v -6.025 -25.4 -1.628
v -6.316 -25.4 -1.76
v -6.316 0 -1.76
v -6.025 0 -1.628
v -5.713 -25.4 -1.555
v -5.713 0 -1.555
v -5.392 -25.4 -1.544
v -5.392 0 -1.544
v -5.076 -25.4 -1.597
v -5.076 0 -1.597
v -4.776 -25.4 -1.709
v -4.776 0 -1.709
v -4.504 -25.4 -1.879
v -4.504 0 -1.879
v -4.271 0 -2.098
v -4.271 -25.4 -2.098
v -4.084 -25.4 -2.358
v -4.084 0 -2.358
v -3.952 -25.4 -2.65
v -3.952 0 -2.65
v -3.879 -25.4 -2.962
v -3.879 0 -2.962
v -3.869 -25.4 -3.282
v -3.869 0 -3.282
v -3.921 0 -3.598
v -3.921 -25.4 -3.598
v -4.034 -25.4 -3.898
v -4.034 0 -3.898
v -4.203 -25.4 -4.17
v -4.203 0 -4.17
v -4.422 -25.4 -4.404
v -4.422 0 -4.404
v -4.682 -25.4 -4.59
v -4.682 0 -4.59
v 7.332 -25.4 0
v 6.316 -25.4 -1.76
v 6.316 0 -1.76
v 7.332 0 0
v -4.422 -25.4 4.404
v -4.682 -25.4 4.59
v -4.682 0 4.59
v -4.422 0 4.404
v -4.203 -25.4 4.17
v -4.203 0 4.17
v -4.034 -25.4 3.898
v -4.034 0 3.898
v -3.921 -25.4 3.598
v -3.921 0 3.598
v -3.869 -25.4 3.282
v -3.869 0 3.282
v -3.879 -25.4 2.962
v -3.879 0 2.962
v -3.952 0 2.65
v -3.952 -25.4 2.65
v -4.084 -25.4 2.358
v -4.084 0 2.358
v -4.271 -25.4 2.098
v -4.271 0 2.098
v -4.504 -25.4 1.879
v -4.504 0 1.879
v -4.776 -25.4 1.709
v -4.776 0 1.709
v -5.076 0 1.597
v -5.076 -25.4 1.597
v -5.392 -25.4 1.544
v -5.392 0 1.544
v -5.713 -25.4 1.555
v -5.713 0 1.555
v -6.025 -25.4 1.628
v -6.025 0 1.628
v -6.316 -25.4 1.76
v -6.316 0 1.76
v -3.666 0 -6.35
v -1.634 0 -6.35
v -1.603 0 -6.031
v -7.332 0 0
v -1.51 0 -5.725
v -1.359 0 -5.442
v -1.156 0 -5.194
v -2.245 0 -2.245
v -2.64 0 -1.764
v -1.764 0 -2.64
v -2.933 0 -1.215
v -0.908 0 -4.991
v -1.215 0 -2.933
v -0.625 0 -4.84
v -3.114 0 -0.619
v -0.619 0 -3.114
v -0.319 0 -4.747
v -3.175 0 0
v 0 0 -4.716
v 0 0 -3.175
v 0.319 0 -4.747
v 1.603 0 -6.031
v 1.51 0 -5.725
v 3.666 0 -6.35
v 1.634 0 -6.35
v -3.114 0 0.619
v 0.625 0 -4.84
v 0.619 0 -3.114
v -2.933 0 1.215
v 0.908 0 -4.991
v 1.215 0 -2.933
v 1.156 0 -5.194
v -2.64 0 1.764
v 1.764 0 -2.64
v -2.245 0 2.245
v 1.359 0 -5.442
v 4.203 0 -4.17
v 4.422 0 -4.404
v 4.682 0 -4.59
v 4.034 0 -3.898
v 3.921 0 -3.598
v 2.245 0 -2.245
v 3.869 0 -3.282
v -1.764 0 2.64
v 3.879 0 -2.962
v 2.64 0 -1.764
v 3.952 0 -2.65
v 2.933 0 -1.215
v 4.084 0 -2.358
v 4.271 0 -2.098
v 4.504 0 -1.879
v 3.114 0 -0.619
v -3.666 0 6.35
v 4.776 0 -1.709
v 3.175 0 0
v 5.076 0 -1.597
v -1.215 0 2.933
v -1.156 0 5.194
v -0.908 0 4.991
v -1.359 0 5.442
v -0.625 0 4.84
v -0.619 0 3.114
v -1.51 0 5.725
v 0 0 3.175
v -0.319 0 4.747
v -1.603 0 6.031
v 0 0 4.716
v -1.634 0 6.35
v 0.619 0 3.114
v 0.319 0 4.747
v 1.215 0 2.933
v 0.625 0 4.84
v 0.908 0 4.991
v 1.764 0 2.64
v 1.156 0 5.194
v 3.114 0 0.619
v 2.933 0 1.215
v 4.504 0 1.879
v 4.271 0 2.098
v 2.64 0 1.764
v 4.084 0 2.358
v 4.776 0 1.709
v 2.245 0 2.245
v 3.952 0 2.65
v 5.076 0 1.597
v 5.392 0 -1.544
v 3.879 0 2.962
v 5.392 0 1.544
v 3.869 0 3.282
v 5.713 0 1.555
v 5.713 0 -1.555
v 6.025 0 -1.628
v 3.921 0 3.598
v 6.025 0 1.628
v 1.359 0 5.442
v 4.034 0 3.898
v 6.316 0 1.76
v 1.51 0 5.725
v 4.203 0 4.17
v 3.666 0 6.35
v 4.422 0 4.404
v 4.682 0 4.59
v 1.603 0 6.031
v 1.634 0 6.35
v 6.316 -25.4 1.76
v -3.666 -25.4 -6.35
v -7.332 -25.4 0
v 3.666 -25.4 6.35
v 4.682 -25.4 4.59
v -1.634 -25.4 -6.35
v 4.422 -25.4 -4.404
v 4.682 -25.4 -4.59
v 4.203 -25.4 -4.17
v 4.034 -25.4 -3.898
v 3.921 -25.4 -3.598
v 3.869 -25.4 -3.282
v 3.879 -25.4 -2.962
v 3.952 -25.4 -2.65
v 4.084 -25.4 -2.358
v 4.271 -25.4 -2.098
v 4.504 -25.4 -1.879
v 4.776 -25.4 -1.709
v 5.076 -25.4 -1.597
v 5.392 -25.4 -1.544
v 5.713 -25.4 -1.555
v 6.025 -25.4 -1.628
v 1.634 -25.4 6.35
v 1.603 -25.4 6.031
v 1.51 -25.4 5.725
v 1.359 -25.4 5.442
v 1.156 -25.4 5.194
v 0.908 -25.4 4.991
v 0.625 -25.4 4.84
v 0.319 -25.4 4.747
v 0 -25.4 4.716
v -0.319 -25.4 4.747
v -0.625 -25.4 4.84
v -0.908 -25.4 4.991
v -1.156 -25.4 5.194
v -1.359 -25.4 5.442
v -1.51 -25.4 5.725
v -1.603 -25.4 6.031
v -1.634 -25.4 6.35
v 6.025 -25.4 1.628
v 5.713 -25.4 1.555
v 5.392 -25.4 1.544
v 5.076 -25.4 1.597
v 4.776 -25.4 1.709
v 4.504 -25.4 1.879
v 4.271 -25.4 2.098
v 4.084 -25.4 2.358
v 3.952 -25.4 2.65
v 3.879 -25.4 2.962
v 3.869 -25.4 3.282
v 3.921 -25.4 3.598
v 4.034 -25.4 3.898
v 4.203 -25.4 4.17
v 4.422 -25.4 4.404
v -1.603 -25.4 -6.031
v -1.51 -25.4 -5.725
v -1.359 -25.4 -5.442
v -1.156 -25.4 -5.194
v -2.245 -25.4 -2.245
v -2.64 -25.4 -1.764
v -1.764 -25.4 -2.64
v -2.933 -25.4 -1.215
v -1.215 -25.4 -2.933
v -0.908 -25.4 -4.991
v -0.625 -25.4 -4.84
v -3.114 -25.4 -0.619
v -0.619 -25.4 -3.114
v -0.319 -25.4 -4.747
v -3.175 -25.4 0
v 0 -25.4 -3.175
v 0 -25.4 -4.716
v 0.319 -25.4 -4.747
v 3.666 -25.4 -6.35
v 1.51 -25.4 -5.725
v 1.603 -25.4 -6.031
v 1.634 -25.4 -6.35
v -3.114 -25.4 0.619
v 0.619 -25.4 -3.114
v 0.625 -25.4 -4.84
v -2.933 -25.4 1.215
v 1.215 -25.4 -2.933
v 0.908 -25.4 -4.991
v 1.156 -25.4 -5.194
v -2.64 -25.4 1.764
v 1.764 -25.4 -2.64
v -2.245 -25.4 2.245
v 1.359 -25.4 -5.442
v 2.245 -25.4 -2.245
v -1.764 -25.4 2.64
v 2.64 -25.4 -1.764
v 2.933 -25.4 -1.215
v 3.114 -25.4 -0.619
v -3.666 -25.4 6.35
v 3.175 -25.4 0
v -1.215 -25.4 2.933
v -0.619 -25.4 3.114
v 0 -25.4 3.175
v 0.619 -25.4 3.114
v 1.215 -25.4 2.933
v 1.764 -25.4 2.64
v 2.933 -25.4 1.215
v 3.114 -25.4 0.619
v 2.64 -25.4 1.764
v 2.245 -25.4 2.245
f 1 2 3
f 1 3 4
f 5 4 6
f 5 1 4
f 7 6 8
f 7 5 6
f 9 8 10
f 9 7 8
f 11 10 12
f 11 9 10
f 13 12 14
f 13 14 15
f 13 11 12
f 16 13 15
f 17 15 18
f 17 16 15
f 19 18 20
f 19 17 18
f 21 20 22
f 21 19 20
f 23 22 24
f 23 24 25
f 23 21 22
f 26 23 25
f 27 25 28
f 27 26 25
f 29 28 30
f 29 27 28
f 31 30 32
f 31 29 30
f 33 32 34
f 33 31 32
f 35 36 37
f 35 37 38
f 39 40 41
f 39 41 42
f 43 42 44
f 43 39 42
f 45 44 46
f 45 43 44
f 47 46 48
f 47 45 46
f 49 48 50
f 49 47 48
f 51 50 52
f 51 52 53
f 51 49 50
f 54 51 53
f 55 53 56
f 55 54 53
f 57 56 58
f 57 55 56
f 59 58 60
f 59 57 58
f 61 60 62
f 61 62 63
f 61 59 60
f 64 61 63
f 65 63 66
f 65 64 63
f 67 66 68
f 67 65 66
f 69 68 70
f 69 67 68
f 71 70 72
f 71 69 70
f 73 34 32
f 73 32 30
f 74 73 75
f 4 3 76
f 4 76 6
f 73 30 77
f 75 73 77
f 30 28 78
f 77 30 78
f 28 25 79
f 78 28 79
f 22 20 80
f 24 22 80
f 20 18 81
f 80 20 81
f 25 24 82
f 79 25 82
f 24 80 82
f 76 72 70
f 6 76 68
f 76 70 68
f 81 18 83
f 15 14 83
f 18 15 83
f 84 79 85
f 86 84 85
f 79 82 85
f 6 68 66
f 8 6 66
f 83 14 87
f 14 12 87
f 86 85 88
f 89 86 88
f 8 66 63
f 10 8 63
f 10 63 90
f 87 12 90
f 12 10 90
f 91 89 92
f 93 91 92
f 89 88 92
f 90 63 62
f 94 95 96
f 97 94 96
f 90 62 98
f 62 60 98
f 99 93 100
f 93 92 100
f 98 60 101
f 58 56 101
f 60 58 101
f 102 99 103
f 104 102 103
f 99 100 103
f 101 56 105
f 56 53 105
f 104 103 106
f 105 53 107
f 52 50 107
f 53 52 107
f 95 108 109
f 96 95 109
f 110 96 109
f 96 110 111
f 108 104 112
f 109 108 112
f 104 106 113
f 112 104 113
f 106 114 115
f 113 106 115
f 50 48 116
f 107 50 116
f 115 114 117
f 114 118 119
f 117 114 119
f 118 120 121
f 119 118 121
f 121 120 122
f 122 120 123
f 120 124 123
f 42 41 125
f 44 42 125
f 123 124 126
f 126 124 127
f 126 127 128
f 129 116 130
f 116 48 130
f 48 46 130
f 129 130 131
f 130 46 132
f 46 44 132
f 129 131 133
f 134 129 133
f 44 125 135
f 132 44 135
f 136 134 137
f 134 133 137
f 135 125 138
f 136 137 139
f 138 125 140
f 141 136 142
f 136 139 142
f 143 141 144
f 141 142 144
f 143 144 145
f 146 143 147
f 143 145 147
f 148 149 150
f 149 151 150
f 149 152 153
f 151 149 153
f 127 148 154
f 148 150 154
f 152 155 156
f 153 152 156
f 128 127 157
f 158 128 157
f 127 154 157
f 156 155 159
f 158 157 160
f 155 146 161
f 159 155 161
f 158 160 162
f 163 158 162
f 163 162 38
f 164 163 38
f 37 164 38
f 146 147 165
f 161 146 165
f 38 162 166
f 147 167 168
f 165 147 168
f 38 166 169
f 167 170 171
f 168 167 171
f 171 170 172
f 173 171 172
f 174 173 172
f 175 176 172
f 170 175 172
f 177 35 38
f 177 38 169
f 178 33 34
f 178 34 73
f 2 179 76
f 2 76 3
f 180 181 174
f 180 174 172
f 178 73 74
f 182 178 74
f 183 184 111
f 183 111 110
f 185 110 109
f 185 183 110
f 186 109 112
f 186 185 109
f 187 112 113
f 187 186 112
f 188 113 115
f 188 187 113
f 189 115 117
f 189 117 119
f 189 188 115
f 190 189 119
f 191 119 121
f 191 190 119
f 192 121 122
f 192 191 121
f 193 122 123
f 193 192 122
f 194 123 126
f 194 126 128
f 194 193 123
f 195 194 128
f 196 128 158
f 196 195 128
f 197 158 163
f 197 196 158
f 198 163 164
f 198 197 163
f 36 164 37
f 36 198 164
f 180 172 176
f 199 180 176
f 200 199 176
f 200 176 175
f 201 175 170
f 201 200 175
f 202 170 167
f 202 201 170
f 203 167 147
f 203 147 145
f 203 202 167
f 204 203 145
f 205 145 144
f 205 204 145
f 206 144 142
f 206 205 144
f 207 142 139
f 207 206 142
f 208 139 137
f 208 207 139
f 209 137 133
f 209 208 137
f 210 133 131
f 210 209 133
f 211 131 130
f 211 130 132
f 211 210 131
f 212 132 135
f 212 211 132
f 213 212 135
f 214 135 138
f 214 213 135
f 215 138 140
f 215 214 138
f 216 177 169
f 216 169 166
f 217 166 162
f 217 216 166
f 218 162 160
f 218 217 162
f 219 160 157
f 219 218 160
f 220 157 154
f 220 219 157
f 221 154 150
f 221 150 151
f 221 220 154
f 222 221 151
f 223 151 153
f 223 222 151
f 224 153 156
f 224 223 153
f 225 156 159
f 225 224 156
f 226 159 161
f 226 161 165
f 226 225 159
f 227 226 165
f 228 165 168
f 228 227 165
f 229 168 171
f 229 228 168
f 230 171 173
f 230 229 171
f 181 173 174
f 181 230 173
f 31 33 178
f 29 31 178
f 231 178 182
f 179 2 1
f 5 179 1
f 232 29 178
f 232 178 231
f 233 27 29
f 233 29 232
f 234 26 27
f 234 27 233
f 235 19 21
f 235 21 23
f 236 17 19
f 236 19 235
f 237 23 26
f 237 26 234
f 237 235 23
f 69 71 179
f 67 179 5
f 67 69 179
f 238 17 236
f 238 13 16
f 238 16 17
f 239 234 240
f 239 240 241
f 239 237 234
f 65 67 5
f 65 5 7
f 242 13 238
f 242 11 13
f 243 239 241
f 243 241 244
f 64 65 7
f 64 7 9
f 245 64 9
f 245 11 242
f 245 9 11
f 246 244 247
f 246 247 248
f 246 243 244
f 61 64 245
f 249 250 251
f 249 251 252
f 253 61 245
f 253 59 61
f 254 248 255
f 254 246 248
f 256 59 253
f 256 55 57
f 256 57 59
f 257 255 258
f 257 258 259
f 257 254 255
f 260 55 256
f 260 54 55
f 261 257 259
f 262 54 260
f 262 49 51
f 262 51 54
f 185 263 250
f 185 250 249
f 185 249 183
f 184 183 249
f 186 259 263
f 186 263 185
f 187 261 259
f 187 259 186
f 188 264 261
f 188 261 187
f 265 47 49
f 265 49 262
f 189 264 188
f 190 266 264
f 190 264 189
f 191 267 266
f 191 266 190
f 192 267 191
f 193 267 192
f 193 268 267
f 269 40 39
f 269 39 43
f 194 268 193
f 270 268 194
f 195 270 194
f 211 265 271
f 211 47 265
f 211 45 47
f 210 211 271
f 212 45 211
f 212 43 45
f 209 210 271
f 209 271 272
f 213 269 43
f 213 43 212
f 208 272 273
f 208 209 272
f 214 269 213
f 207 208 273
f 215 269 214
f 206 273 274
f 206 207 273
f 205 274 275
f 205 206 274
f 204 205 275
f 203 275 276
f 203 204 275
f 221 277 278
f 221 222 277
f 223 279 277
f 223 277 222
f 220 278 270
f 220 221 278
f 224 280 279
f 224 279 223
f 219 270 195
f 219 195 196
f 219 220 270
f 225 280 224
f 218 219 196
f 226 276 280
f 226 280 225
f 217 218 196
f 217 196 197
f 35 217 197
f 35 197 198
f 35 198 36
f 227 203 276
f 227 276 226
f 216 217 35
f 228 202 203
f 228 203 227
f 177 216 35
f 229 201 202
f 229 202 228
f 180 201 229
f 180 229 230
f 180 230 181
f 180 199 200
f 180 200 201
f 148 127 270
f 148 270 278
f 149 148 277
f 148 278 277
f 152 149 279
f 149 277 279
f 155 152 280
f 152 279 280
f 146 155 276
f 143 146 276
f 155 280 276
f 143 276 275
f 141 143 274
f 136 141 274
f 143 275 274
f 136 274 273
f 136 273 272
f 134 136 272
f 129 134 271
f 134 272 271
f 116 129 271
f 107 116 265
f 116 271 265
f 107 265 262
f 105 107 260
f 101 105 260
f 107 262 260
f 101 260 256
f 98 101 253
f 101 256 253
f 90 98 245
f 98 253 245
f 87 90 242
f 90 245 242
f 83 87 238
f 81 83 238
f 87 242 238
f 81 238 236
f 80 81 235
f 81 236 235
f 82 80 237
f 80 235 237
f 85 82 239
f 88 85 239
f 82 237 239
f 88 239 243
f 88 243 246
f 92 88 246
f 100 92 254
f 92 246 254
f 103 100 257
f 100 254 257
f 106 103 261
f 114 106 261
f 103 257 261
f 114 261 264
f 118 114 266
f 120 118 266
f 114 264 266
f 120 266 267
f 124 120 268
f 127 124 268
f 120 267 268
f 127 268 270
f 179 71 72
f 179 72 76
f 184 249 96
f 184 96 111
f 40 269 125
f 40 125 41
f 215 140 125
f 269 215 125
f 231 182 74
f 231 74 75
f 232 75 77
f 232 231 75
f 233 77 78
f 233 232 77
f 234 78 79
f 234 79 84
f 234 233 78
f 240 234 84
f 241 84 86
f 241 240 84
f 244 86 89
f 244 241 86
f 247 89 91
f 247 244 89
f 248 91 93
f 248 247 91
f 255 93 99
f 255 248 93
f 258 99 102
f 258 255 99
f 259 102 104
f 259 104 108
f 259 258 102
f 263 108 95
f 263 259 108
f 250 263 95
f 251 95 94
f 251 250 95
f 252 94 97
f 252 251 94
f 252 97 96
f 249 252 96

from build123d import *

# Parameters (mm, degrees)
SKETCH1_R           = 3.175
BOSS_EXTRUDE1_DEPTH = 25.4


with BuildPart() as part:
    # Sketch1 → Boss-Extrude1 (new body)
    with BuildSketch(Plane.XZ.offset(25.4)):
        with BuildLine():
            Line((-4.682174209, -4.59023638), (-3.666174209, -6.35))
            Line((-3.666174209, -6.35), (-1.634174209, -6.35))
            ThreePointArc((-1.634174209, -6.35), (0, -4.715825791), (1.634174209, -6.35))
            Line((1.634174209, -6.35), (3.666174209, -6.35))
            Line((3.666174209, -6.35), (4.682174209, -4.59023638))
            ThreePointArc((4.682174209, -4.59023638), (4.084024935, -2.357912895), (6.316348419, -1.75976362))
            Line((6.316348419, -1.75976362), (7.332348419, 0))
            Line((7.332348419, 0), (6.316348419, 1.75976362))
            ThreePointArc((6.316348419, 1.75976362), (4.084024935, 2.357912895), (4.682174209, 4.59023638))
            Line((4.682174209, 4.59023638), (3.666174209, 6.35))
            Line((3.666174209, 6.35), (1.634174209, 6.35))
            ThreePointArc((1.634174209, 6.35), (0, 4.715825791), (-1.634174209, 6.35))
            Line((-1.634174209, 6.35), (-3.666174209, 6.35))
            Line((-3.666174209, 6.35), (-4.682174209, 4.59023638))
            ThreePointArc((-4.682174209, 4.59023638), (-4.084024935, 2.357912895), (-6.316348419, 1.75976362))
            Line((-6.316348419, 1.75976362), (-7.332348419, 0))
            Line((-7.332348419, 0), (-6.316348419, -1.75976362))
            ThreePointArc((-6.316348419, -1.75976362), (-4.084024935, -2.357912895), (-4.682174209, -4.59023638))
        make_face()
        Circle(SKETCH1_R, mode=Mode.SUBTRACT)
    extrude(amount=-BOSS_EXTRUDE1_DEPTH)


solid = part.part
